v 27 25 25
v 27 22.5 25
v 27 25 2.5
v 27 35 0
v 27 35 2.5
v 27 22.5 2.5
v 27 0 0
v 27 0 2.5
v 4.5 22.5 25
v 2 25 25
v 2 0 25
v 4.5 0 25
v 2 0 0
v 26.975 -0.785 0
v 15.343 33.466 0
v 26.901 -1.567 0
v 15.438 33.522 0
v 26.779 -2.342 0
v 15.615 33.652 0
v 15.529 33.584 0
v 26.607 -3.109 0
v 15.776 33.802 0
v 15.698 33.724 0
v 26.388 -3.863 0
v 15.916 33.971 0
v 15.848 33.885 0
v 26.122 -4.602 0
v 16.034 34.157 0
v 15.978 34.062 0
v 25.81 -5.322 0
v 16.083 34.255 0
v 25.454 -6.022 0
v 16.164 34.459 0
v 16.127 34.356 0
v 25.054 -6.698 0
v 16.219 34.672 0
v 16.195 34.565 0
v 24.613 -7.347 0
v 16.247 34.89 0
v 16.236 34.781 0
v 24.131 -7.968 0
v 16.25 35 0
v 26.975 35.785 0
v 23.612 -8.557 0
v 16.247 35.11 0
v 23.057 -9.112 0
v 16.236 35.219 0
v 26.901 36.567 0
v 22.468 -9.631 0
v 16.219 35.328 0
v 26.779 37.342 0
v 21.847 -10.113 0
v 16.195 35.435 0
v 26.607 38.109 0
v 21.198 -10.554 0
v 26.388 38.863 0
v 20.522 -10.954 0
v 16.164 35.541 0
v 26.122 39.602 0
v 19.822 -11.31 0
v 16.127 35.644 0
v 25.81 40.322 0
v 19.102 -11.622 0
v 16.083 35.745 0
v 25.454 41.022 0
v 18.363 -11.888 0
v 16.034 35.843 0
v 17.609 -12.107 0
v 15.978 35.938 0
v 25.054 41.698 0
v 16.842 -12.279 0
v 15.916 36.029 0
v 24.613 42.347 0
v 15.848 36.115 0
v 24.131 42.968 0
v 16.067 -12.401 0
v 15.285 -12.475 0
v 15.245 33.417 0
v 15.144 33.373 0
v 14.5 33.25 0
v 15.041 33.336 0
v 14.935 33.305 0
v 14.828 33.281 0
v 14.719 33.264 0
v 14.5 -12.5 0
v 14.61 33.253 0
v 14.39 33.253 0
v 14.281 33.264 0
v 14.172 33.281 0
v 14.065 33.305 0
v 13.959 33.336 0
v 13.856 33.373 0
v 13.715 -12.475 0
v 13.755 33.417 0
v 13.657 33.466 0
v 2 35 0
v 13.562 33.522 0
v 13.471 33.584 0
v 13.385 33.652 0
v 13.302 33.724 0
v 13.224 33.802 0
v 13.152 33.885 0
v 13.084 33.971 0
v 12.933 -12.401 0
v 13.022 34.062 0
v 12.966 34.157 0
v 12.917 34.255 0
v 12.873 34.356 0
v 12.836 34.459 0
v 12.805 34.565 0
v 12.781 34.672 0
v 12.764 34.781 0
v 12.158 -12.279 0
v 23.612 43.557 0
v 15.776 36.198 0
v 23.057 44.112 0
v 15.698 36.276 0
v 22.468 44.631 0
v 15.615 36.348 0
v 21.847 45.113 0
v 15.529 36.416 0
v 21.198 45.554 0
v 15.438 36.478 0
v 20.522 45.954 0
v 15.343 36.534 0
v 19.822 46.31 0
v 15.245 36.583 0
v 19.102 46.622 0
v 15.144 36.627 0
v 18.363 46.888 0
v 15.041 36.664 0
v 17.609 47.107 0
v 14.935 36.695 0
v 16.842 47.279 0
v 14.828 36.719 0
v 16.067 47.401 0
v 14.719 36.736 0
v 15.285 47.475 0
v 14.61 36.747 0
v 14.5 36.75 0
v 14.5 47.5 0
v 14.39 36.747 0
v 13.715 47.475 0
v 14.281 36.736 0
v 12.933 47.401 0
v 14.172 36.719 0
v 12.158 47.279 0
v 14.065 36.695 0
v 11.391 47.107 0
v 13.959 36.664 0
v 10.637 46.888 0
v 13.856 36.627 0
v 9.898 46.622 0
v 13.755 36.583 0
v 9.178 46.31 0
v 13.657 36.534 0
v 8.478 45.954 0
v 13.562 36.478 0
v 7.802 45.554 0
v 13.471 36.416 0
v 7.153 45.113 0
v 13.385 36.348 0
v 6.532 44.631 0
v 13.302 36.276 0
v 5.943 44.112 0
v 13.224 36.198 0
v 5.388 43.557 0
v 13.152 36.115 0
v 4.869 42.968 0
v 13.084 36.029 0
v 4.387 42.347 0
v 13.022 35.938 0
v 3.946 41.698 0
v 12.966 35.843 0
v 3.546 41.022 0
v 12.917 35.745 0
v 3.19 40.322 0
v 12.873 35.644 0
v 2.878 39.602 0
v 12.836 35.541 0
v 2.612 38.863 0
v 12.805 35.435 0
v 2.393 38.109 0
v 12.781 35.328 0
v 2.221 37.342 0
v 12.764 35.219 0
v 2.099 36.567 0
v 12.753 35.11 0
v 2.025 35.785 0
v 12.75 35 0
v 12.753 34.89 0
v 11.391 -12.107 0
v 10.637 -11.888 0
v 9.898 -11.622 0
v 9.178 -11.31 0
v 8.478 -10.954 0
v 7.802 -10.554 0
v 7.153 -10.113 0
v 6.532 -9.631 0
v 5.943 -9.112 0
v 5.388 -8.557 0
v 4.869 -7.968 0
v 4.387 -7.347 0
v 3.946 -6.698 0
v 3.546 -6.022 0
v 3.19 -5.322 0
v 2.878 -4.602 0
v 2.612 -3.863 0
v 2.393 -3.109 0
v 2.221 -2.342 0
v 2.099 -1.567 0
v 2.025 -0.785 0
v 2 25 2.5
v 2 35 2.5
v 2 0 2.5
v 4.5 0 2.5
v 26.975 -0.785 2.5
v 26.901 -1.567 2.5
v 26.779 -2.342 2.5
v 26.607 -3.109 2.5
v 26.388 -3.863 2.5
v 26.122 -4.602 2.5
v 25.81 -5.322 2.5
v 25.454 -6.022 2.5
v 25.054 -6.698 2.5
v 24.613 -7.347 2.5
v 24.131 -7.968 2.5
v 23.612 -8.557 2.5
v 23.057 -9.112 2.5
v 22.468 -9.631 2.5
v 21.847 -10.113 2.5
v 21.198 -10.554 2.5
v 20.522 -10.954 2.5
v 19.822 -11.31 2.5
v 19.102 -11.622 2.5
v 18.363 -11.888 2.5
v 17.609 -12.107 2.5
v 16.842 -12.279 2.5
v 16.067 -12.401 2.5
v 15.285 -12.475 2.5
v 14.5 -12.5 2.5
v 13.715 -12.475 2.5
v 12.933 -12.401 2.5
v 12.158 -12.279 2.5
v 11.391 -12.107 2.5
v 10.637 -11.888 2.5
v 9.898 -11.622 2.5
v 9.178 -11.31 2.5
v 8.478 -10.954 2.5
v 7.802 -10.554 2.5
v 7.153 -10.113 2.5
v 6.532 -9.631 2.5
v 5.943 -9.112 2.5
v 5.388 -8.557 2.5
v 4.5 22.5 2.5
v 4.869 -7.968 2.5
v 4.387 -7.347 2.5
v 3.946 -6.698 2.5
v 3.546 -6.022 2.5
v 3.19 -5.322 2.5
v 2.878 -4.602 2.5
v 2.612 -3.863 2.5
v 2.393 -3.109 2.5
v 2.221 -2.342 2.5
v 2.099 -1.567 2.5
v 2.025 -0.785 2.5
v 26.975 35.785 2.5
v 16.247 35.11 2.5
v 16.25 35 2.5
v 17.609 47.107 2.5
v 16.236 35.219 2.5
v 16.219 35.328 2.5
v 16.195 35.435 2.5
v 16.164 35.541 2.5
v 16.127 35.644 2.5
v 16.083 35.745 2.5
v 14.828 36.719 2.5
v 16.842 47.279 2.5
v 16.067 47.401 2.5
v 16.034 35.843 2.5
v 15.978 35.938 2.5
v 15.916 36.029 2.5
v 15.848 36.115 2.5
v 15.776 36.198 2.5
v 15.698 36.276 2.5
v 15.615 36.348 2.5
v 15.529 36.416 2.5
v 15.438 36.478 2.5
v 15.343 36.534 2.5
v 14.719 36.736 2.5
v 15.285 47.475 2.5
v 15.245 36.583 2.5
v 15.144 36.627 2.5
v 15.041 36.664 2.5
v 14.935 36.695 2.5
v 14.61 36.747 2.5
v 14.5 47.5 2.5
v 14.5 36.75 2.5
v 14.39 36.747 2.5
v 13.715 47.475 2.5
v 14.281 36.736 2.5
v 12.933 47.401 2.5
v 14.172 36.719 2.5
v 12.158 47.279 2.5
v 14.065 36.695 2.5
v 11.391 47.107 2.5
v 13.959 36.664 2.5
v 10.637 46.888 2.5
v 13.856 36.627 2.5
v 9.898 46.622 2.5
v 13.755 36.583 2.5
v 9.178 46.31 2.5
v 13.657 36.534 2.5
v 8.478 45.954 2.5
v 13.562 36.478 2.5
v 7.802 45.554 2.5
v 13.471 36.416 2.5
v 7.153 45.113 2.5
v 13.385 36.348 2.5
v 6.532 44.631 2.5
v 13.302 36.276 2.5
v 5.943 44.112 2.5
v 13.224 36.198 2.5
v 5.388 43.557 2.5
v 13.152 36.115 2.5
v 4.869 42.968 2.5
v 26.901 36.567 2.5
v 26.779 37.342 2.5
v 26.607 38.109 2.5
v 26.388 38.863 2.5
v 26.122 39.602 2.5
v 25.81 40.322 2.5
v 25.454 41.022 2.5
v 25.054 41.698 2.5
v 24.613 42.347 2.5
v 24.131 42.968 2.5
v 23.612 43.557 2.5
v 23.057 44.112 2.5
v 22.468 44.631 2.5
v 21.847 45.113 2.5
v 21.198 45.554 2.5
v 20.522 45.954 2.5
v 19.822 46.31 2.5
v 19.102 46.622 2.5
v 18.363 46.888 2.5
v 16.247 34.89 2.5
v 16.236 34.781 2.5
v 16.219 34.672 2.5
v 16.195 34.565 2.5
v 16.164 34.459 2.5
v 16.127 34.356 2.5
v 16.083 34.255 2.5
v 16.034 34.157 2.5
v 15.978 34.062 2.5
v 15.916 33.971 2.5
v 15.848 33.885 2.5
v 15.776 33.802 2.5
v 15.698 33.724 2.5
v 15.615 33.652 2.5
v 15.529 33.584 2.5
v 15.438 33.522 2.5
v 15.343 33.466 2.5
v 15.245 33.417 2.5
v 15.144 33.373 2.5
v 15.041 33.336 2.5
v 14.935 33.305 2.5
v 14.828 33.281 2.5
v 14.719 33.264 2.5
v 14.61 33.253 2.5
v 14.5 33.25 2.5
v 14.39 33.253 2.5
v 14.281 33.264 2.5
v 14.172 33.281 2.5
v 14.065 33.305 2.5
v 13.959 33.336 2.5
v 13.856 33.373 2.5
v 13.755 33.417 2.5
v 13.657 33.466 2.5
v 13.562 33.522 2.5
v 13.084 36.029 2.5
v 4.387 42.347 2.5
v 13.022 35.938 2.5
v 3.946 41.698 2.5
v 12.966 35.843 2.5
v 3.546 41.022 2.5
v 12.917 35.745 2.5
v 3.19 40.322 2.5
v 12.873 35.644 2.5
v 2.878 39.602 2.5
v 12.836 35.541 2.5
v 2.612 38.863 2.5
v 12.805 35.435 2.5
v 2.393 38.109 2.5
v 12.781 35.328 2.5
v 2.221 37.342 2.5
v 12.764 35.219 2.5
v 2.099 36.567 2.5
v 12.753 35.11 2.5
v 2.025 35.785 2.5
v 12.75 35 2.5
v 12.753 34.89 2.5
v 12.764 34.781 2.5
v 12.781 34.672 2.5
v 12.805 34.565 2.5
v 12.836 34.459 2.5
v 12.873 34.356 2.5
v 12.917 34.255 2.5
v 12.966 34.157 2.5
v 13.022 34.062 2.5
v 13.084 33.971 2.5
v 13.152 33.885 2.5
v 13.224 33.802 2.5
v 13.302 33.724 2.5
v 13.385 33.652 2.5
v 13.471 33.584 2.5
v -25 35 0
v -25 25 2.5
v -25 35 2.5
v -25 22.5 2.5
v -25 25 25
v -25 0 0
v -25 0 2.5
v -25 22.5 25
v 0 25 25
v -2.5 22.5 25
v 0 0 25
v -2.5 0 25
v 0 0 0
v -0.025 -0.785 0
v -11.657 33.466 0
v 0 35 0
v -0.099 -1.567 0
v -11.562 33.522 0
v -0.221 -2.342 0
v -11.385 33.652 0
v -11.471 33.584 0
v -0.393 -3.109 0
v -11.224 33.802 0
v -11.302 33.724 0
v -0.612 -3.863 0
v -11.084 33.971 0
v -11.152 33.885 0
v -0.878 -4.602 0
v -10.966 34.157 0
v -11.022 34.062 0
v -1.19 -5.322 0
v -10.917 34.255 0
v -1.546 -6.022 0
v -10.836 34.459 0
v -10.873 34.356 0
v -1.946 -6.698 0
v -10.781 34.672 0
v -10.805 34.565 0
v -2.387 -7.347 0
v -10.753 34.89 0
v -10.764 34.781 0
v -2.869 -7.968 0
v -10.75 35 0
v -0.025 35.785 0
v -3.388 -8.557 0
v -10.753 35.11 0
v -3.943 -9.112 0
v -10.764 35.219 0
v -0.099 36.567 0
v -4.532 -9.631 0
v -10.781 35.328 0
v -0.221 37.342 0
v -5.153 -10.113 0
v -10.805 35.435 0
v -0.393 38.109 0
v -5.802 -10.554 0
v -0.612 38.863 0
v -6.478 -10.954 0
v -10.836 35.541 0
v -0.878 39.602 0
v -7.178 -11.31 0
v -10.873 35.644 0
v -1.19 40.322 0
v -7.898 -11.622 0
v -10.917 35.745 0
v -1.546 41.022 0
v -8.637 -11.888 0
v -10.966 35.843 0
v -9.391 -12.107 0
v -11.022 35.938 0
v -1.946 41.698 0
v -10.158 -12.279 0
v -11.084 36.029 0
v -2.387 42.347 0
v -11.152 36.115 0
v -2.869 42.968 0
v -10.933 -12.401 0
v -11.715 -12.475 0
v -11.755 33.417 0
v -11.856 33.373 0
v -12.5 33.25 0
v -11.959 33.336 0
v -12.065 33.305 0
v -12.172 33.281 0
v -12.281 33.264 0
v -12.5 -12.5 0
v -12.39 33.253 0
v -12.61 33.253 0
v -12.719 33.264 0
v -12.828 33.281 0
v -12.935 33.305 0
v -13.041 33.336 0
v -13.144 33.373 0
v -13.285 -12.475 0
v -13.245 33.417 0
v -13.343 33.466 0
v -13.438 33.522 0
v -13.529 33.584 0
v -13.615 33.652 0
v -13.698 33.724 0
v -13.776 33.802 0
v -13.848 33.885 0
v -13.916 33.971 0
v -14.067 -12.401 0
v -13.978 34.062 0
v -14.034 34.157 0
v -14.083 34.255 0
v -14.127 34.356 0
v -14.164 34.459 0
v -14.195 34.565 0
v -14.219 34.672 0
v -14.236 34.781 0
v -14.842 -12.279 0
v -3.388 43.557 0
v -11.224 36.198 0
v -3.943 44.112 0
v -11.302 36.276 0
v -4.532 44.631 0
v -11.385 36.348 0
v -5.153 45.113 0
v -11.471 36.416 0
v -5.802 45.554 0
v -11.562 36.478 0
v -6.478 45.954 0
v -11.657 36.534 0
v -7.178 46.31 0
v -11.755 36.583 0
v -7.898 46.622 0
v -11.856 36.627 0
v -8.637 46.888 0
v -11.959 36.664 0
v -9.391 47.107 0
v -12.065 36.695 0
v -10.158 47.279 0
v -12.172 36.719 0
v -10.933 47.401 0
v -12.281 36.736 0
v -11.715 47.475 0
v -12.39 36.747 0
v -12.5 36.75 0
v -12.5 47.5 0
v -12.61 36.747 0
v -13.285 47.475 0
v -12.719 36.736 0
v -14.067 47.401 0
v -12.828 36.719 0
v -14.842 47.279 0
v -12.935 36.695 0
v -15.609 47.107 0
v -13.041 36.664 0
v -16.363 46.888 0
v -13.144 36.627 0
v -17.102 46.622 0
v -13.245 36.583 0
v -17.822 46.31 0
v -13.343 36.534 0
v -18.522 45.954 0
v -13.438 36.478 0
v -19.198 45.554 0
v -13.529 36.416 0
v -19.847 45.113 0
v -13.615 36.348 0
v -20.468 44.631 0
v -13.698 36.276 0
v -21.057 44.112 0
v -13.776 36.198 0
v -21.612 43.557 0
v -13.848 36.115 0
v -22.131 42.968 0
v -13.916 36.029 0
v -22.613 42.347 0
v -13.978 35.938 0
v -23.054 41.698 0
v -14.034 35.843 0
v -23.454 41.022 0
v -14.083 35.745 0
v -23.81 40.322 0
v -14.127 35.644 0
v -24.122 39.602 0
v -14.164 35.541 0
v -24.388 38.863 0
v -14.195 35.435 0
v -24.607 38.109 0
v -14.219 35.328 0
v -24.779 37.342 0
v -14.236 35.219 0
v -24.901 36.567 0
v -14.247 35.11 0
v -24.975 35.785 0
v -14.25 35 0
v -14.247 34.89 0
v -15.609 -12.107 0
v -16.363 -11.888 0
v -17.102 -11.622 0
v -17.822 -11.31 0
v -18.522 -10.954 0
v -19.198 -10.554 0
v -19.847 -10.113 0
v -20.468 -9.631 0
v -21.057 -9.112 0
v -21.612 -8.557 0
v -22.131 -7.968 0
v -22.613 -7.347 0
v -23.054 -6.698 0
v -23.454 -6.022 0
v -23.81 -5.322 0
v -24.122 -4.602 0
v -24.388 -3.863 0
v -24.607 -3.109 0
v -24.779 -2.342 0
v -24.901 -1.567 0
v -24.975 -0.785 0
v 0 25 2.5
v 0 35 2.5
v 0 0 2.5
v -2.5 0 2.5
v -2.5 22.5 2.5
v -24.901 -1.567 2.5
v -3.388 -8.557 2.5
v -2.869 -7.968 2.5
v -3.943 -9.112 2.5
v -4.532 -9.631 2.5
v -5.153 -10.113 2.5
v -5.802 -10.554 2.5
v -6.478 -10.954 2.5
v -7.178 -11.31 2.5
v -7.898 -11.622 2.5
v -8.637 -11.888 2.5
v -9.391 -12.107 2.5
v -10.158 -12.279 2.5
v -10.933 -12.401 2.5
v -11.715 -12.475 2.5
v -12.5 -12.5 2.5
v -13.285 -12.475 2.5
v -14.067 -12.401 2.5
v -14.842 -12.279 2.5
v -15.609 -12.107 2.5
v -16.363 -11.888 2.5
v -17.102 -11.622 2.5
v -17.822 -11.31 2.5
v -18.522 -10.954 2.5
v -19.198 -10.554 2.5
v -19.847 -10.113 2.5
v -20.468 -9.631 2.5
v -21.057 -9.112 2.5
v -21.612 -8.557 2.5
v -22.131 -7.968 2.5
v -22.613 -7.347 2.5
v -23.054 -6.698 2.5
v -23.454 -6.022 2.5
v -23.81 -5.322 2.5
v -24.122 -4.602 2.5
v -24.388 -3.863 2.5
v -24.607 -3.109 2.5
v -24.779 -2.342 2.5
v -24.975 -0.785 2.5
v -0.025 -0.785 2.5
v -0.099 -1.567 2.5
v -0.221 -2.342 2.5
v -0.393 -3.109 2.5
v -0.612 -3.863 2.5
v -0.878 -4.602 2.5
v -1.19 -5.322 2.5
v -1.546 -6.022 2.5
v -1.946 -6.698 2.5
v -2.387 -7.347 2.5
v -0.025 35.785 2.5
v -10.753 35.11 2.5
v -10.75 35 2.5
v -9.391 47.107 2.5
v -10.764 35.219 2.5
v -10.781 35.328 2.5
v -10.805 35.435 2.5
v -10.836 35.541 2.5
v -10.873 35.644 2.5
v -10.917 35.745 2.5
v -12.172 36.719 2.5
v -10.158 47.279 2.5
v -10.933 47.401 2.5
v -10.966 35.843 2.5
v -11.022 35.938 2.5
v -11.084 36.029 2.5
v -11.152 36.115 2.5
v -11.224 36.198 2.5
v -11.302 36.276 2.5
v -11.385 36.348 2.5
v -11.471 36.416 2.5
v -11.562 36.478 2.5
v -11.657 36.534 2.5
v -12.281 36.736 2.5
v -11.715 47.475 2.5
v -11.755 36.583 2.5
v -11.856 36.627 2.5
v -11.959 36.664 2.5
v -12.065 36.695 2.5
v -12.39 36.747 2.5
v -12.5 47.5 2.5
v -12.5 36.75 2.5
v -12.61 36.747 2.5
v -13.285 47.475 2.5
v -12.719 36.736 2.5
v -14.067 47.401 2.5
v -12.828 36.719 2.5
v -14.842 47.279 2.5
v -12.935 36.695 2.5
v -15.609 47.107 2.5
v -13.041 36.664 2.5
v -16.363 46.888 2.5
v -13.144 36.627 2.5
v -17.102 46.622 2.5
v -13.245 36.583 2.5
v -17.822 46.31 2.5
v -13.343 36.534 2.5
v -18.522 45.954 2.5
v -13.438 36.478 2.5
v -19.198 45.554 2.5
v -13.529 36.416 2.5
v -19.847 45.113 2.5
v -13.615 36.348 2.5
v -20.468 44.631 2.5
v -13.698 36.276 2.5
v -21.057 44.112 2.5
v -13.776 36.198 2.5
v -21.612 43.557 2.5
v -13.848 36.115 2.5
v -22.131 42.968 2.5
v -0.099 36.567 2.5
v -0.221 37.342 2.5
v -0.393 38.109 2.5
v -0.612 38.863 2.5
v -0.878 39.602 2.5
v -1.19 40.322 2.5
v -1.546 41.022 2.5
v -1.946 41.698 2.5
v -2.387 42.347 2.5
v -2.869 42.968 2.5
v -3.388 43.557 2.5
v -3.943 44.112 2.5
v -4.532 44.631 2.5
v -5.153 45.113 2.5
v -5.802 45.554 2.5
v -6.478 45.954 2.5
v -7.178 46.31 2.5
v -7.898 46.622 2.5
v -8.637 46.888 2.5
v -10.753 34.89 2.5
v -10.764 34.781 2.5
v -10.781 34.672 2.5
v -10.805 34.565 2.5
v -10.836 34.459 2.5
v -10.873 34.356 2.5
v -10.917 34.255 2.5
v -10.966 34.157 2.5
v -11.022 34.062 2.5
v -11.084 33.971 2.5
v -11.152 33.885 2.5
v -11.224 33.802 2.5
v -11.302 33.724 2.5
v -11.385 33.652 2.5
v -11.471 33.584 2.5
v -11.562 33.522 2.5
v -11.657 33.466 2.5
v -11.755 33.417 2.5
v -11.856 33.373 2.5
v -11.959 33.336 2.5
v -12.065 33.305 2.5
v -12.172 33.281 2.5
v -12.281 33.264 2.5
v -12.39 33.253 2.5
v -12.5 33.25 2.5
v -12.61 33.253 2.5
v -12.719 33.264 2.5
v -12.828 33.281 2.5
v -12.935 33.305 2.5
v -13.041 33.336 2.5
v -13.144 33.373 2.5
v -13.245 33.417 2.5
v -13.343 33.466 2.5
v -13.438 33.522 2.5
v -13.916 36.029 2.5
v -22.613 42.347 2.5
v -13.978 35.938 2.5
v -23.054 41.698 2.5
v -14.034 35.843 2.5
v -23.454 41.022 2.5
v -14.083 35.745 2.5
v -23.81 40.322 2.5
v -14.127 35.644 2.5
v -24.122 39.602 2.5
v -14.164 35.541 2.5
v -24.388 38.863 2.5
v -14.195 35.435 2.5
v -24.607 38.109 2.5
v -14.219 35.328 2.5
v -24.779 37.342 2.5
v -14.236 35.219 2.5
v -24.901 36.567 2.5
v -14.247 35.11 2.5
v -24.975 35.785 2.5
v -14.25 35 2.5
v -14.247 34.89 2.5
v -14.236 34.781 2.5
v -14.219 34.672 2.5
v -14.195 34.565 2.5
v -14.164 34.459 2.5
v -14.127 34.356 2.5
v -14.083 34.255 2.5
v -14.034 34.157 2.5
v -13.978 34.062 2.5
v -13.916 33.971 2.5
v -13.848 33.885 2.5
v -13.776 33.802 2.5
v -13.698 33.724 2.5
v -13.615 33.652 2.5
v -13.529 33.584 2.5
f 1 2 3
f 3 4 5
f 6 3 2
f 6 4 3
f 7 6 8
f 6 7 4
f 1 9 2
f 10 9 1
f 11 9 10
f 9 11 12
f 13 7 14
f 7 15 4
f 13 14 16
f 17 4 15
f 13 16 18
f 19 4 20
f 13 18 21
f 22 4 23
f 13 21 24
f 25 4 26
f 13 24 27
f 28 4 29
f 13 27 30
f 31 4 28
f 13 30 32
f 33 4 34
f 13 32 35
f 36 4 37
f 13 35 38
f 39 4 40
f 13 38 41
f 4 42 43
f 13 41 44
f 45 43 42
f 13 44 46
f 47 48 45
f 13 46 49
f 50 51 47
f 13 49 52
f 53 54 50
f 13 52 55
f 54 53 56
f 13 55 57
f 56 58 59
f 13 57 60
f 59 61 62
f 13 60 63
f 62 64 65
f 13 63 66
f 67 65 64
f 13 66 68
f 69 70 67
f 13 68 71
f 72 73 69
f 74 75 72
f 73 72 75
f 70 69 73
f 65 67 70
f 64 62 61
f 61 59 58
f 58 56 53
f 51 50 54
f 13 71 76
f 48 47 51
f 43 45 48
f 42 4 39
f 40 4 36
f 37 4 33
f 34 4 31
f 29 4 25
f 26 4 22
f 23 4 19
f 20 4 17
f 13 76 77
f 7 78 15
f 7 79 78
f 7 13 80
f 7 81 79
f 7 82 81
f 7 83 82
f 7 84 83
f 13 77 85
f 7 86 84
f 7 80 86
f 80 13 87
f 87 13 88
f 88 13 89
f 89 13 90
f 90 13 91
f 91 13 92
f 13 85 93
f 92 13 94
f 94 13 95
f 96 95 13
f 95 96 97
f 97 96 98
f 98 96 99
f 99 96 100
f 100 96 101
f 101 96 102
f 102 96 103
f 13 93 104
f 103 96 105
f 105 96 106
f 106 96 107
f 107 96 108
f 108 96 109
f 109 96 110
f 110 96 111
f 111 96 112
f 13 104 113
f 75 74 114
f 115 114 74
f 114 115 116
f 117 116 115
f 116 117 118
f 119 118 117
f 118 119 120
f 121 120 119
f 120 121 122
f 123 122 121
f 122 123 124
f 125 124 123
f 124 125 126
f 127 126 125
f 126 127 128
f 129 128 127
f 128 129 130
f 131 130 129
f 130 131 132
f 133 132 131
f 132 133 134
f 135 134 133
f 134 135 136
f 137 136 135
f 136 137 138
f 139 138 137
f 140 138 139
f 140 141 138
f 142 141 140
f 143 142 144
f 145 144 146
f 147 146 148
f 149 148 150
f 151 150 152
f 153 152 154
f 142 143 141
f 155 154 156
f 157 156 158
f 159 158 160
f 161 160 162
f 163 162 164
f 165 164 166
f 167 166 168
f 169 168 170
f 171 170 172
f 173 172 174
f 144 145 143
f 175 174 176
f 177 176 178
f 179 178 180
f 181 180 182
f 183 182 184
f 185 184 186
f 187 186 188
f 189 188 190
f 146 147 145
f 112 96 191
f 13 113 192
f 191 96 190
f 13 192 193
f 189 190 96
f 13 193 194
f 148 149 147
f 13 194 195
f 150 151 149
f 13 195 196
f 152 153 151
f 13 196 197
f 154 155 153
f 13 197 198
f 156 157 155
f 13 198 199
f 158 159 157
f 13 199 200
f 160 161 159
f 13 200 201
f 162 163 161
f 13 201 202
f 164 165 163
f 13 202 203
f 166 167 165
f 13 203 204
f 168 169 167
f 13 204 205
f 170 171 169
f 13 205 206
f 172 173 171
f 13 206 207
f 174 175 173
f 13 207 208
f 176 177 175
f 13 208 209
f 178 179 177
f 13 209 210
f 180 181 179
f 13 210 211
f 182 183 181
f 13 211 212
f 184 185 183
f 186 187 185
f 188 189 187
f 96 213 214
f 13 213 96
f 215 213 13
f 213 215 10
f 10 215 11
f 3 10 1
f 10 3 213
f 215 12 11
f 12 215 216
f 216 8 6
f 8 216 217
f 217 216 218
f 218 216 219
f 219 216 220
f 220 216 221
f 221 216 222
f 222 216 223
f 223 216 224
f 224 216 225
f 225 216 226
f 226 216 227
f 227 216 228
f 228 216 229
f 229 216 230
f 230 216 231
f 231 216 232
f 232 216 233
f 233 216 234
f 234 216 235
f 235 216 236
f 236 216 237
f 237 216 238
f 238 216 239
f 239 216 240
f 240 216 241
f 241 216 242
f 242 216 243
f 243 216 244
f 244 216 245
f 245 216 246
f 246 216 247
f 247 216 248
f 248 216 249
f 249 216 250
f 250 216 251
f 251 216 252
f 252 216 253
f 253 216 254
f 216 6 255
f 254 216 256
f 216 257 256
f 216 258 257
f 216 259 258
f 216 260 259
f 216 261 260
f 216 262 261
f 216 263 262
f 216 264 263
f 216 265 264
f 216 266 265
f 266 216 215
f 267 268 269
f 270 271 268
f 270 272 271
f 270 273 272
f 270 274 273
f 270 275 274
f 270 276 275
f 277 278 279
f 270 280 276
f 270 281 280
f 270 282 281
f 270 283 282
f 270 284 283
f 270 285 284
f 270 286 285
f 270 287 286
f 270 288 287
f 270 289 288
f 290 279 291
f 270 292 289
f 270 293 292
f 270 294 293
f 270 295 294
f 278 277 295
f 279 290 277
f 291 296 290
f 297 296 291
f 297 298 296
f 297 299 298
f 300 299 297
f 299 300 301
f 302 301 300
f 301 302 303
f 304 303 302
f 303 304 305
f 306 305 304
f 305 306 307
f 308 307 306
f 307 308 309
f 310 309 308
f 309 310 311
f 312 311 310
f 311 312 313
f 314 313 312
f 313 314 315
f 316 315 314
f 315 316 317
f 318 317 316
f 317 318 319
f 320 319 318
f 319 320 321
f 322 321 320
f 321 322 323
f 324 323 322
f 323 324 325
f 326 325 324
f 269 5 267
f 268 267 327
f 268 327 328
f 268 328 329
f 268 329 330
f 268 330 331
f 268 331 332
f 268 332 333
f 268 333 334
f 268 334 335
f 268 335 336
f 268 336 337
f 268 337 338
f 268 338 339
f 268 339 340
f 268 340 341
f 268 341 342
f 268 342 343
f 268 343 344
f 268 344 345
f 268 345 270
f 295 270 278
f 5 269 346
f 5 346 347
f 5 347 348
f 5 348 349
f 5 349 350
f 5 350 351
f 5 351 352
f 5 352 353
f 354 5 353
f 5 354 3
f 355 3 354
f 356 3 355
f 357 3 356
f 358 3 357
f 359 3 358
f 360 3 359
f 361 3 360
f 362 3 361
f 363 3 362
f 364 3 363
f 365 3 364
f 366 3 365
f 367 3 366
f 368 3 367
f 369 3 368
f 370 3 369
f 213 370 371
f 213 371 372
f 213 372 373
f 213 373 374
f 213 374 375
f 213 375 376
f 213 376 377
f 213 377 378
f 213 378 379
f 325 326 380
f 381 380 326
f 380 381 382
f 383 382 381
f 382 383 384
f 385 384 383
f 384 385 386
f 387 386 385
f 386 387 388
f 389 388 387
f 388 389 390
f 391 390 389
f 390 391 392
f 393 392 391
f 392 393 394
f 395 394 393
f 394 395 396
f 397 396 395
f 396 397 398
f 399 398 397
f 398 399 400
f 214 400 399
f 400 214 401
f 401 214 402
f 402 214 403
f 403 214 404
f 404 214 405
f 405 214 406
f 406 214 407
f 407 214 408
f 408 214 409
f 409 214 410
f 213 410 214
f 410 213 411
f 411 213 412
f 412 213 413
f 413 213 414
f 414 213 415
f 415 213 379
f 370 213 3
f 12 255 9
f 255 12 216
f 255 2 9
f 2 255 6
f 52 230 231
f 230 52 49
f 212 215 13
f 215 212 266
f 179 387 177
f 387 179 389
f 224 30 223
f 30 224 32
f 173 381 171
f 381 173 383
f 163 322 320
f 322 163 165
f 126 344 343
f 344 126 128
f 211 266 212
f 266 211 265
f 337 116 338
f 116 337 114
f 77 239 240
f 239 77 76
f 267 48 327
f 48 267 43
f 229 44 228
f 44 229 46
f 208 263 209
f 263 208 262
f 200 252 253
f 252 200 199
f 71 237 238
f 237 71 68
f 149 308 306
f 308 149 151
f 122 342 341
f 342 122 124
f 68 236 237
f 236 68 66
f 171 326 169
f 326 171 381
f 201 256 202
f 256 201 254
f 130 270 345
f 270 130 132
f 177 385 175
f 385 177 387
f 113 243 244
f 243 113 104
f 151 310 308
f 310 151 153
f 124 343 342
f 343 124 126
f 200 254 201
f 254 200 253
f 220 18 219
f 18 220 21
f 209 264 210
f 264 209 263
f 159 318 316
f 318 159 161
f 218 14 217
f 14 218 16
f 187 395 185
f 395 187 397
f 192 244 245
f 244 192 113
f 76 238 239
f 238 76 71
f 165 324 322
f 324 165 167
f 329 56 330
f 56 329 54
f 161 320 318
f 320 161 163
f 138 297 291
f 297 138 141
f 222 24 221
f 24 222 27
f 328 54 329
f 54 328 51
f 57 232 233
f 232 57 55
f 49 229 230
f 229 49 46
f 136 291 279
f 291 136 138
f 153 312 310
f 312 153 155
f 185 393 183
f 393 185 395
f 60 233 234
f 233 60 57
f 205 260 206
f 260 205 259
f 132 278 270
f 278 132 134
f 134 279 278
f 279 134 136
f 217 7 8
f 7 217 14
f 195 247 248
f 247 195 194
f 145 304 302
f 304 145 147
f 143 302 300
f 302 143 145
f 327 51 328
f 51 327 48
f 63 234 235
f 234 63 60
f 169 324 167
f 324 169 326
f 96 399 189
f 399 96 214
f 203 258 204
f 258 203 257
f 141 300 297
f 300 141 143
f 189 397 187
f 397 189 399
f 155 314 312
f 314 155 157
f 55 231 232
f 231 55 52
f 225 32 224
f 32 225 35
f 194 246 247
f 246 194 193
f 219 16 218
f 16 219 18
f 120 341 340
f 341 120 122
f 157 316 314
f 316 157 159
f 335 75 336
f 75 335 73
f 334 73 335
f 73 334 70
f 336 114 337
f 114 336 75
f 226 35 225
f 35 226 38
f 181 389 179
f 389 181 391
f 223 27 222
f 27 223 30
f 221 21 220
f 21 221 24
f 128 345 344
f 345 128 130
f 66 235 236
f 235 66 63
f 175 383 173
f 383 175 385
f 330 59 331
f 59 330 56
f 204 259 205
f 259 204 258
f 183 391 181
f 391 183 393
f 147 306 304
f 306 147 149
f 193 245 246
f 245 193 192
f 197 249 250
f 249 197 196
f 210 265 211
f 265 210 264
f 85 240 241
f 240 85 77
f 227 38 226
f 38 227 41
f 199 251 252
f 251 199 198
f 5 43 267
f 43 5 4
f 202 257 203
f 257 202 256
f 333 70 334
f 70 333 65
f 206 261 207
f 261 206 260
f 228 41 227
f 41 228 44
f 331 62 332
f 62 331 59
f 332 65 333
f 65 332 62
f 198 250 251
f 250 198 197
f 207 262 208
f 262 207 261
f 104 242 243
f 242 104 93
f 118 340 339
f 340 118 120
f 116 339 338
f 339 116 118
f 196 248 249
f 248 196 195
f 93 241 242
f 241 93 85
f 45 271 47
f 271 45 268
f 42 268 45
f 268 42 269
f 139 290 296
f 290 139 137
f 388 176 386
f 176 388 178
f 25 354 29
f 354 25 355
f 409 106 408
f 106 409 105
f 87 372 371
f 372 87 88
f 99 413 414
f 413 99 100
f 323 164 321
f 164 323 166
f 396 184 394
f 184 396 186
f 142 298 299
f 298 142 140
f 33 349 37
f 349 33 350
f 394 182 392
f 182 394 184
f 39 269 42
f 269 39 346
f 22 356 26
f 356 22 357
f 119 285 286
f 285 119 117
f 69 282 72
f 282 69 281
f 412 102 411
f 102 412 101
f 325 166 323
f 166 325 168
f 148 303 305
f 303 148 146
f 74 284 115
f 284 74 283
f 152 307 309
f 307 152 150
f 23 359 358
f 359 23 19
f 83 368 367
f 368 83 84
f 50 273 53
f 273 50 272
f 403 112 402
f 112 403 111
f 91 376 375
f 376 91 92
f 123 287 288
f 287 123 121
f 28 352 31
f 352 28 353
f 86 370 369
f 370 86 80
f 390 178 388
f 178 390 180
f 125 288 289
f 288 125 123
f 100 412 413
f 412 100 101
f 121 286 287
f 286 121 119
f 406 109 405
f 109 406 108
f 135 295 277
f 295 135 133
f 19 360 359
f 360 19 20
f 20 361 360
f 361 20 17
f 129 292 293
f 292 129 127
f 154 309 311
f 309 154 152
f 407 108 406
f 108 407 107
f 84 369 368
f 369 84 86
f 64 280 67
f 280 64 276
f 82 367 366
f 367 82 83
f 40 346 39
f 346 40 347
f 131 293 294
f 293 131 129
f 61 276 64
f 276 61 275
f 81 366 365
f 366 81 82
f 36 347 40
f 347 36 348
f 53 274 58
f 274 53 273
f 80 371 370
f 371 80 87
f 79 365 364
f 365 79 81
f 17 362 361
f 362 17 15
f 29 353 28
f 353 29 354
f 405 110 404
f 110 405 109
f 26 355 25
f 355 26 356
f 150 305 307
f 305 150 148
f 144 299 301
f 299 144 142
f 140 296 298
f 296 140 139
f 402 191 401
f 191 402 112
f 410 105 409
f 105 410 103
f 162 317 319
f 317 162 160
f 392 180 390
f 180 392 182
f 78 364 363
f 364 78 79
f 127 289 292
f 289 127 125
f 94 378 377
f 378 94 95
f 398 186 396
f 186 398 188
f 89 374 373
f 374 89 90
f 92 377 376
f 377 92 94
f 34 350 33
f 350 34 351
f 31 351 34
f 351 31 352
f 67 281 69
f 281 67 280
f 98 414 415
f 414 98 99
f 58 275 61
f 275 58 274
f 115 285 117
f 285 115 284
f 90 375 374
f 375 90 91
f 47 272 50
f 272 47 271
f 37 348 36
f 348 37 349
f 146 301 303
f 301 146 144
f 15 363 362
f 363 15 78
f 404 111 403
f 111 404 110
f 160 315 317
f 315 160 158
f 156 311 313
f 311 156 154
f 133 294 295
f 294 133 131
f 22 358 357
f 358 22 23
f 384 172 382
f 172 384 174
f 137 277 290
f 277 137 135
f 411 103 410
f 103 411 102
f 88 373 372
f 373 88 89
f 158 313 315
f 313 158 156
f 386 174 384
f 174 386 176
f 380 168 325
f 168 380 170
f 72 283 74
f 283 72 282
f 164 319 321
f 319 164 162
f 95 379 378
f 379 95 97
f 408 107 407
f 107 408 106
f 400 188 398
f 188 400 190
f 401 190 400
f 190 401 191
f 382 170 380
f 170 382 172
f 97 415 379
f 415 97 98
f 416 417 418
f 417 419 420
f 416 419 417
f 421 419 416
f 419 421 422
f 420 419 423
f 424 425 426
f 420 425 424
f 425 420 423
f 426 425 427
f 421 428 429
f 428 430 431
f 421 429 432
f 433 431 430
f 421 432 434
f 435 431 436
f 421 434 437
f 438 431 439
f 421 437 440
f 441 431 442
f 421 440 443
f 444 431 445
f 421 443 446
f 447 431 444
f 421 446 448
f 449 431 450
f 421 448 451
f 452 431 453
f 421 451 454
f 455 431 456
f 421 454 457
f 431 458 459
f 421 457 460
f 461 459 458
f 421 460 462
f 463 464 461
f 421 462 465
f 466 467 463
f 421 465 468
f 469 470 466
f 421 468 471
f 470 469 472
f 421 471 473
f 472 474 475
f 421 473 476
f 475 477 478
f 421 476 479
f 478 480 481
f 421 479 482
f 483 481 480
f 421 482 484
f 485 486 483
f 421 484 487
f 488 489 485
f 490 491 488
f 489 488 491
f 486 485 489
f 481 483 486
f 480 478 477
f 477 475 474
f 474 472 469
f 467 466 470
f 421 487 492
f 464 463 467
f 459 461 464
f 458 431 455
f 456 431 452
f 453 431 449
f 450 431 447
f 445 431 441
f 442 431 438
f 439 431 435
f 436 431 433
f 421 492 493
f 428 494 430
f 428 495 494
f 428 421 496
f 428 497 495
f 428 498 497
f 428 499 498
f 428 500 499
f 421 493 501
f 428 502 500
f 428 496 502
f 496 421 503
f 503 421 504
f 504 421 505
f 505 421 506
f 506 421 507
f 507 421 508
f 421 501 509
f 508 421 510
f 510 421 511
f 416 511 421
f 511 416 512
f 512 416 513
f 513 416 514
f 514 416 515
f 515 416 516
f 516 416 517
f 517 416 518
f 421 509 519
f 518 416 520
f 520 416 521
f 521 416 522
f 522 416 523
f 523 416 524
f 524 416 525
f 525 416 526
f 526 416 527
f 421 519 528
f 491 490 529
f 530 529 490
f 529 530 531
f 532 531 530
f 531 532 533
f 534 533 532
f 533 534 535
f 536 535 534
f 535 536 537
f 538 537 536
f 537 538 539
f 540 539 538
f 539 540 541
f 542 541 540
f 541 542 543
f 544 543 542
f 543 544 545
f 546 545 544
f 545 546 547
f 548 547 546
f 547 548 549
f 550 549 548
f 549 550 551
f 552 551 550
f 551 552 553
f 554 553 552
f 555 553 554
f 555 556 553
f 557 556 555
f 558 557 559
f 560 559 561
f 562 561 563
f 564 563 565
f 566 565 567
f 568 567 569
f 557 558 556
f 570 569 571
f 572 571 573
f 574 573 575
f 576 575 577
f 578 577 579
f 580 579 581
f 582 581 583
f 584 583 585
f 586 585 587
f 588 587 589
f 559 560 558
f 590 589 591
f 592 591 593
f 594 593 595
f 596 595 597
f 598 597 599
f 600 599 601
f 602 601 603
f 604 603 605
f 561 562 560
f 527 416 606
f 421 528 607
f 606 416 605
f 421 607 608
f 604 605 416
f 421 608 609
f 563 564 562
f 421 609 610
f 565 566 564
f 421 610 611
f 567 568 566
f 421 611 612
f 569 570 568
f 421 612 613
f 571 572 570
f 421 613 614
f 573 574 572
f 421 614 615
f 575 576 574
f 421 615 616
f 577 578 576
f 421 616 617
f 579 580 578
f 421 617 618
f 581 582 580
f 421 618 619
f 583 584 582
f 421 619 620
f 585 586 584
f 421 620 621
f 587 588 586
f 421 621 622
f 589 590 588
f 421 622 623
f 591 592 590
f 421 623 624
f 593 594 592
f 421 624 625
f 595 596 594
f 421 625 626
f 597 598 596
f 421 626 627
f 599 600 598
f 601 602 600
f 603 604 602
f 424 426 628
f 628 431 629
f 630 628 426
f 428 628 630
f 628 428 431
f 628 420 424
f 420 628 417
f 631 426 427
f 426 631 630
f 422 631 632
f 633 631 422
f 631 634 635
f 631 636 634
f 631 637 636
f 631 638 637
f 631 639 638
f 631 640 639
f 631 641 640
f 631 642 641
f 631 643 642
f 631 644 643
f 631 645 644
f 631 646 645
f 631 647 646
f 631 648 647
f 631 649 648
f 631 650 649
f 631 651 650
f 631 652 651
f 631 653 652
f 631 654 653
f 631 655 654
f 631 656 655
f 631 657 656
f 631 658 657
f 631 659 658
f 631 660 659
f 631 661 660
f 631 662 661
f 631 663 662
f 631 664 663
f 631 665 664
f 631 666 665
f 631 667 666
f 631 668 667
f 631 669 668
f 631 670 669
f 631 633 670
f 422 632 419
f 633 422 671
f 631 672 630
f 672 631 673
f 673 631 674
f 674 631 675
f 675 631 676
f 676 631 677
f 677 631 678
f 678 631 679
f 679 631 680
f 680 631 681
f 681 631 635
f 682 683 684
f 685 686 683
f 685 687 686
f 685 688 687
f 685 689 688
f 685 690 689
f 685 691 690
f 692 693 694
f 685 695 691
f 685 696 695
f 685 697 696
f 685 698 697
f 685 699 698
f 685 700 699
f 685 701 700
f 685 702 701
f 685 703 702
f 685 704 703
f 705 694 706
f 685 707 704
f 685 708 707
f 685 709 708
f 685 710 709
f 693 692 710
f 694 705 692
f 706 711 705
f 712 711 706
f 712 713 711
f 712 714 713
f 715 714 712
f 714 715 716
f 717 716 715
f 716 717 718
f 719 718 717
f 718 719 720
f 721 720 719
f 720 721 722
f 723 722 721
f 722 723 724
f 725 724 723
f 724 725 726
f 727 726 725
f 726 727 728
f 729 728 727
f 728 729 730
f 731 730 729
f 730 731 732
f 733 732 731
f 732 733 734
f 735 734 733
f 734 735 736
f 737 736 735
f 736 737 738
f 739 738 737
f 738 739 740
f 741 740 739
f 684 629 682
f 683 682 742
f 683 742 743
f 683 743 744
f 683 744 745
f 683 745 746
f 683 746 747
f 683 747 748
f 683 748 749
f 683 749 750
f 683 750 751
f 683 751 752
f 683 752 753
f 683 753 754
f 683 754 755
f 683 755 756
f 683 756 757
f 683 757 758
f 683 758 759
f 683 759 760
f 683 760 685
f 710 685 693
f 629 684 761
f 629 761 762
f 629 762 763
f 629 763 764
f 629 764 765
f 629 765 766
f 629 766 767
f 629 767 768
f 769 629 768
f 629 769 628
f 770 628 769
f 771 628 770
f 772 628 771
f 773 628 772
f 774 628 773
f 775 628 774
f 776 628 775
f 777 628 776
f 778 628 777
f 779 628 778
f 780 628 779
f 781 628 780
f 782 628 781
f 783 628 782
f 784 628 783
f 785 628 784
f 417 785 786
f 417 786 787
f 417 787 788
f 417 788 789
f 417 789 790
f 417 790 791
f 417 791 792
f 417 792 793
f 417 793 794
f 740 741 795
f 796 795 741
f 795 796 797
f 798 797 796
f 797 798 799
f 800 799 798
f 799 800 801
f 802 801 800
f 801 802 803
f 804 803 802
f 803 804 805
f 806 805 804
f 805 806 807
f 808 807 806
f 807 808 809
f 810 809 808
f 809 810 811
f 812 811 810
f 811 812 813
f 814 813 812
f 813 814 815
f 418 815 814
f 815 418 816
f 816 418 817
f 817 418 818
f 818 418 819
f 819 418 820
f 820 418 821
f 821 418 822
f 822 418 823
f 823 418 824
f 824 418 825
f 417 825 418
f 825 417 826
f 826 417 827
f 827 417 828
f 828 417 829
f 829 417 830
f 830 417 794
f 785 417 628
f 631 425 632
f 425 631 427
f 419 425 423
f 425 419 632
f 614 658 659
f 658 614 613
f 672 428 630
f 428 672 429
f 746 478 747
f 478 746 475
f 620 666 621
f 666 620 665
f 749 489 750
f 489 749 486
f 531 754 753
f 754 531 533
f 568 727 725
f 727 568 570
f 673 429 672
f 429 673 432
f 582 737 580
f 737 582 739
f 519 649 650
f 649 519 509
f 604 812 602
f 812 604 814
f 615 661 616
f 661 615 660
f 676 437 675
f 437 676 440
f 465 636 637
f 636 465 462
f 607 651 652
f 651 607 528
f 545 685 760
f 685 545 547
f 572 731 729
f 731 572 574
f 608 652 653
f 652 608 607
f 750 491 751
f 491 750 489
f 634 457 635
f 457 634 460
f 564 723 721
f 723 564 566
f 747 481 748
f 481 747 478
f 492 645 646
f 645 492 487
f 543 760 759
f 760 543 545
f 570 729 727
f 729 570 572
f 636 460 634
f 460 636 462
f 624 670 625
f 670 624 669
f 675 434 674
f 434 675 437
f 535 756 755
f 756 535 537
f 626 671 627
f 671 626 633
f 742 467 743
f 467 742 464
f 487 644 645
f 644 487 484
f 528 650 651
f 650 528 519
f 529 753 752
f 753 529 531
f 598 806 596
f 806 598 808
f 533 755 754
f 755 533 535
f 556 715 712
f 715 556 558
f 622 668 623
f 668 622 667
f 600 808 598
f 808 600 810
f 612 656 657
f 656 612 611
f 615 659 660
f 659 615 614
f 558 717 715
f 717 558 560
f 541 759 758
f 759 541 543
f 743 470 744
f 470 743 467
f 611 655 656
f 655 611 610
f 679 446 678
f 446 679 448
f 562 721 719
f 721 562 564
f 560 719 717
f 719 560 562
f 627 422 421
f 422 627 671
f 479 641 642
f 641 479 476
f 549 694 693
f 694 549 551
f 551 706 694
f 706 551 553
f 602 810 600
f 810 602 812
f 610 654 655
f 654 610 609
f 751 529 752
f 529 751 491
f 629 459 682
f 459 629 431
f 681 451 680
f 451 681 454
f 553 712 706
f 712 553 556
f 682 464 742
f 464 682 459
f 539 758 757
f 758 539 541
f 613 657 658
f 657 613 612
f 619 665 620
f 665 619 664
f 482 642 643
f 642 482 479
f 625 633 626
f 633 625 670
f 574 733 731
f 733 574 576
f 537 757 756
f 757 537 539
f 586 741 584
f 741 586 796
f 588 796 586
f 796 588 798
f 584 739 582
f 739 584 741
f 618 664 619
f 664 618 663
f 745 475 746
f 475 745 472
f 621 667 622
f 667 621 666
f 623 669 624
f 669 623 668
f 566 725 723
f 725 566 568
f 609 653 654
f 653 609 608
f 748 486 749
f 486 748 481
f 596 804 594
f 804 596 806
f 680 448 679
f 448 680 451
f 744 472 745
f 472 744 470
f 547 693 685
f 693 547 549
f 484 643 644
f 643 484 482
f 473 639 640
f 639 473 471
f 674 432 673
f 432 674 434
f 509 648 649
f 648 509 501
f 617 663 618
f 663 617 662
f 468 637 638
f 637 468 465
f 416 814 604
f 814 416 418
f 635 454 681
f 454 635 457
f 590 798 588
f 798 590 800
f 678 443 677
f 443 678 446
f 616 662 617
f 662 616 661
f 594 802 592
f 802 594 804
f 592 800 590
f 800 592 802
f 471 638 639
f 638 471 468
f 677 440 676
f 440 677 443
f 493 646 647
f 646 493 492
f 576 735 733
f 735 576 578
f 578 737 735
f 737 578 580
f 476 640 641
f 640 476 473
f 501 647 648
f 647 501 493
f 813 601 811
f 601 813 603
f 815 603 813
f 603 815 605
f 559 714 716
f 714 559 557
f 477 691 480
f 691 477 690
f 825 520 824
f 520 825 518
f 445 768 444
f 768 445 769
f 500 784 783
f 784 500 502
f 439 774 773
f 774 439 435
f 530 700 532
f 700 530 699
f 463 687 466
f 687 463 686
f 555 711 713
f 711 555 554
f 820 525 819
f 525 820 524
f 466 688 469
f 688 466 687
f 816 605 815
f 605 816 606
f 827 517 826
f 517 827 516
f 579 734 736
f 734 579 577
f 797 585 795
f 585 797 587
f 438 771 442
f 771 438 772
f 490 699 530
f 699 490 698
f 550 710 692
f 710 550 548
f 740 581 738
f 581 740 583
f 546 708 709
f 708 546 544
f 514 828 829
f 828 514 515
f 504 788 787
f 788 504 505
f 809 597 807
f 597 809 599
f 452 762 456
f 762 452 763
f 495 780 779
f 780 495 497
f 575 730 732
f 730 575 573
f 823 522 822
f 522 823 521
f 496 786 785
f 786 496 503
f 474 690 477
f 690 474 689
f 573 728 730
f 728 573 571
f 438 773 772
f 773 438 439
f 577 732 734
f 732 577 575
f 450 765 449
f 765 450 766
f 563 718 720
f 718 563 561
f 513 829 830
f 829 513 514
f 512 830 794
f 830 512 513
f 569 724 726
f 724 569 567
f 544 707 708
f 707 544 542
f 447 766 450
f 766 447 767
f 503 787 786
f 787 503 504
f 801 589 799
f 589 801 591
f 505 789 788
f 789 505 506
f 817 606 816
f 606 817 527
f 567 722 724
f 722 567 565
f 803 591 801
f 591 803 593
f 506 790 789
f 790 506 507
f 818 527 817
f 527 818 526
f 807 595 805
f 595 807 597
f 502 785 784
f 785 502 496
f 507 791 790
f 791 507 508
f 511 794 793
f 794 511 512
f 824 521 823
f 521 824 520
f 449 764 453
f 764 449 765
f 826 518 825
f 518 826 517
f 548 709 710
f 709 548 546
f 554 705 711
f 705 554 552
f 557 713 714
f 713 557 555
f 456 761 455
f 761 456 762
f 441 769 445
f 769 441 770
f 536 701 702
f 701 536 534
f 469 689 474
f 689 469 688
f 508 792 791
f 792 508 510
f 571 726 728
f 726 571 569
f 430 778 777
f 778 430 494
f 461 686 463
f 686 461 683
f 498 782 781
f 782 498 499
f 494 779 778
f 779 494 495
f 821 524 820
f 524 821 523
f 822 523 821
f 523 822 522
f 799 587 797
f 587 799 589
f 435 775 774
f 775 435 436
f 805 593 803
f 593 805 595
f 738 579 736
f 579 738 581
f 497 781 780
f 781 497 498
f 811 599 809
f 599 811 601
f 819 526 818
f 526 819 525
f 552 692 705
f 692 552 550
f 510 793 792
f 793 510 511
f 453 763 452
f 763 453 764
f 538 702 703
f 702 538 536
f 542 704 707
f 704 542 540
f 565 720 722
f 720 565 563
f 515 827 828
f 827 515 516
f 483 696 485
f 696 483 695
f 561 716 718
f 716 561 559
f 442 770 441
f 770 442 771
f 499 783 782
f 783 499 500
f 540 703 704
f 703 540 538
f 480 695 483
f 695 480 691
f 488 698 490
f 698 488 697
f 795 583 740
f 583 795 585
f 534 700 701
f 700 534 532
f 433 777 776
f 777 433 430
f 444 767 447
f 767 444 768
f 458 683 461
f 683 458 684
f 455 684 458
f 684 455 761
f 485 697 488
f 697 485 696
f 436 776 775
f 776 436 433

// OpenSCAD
$fn = 100;

module right() {
  difference() {
    cube(size=[25, 25, 25]);
    translate([2.5,-2.5,2.5]) cube(size=[25, 25, 25]);
  }

  difference() {
    hull() {
      translate([12.5,35,0]) cylinder(r=12.5, h=2.5);
      translate([12.5,0,0]) cylinder(r=12.5, h=2.5);
    }
    translate([12.5, 35, -1]) cylinder(r=1.75, h=50);
  }
}

translate([2,0,0]) right();
mirror([1,0,0]) {
  right();
}
